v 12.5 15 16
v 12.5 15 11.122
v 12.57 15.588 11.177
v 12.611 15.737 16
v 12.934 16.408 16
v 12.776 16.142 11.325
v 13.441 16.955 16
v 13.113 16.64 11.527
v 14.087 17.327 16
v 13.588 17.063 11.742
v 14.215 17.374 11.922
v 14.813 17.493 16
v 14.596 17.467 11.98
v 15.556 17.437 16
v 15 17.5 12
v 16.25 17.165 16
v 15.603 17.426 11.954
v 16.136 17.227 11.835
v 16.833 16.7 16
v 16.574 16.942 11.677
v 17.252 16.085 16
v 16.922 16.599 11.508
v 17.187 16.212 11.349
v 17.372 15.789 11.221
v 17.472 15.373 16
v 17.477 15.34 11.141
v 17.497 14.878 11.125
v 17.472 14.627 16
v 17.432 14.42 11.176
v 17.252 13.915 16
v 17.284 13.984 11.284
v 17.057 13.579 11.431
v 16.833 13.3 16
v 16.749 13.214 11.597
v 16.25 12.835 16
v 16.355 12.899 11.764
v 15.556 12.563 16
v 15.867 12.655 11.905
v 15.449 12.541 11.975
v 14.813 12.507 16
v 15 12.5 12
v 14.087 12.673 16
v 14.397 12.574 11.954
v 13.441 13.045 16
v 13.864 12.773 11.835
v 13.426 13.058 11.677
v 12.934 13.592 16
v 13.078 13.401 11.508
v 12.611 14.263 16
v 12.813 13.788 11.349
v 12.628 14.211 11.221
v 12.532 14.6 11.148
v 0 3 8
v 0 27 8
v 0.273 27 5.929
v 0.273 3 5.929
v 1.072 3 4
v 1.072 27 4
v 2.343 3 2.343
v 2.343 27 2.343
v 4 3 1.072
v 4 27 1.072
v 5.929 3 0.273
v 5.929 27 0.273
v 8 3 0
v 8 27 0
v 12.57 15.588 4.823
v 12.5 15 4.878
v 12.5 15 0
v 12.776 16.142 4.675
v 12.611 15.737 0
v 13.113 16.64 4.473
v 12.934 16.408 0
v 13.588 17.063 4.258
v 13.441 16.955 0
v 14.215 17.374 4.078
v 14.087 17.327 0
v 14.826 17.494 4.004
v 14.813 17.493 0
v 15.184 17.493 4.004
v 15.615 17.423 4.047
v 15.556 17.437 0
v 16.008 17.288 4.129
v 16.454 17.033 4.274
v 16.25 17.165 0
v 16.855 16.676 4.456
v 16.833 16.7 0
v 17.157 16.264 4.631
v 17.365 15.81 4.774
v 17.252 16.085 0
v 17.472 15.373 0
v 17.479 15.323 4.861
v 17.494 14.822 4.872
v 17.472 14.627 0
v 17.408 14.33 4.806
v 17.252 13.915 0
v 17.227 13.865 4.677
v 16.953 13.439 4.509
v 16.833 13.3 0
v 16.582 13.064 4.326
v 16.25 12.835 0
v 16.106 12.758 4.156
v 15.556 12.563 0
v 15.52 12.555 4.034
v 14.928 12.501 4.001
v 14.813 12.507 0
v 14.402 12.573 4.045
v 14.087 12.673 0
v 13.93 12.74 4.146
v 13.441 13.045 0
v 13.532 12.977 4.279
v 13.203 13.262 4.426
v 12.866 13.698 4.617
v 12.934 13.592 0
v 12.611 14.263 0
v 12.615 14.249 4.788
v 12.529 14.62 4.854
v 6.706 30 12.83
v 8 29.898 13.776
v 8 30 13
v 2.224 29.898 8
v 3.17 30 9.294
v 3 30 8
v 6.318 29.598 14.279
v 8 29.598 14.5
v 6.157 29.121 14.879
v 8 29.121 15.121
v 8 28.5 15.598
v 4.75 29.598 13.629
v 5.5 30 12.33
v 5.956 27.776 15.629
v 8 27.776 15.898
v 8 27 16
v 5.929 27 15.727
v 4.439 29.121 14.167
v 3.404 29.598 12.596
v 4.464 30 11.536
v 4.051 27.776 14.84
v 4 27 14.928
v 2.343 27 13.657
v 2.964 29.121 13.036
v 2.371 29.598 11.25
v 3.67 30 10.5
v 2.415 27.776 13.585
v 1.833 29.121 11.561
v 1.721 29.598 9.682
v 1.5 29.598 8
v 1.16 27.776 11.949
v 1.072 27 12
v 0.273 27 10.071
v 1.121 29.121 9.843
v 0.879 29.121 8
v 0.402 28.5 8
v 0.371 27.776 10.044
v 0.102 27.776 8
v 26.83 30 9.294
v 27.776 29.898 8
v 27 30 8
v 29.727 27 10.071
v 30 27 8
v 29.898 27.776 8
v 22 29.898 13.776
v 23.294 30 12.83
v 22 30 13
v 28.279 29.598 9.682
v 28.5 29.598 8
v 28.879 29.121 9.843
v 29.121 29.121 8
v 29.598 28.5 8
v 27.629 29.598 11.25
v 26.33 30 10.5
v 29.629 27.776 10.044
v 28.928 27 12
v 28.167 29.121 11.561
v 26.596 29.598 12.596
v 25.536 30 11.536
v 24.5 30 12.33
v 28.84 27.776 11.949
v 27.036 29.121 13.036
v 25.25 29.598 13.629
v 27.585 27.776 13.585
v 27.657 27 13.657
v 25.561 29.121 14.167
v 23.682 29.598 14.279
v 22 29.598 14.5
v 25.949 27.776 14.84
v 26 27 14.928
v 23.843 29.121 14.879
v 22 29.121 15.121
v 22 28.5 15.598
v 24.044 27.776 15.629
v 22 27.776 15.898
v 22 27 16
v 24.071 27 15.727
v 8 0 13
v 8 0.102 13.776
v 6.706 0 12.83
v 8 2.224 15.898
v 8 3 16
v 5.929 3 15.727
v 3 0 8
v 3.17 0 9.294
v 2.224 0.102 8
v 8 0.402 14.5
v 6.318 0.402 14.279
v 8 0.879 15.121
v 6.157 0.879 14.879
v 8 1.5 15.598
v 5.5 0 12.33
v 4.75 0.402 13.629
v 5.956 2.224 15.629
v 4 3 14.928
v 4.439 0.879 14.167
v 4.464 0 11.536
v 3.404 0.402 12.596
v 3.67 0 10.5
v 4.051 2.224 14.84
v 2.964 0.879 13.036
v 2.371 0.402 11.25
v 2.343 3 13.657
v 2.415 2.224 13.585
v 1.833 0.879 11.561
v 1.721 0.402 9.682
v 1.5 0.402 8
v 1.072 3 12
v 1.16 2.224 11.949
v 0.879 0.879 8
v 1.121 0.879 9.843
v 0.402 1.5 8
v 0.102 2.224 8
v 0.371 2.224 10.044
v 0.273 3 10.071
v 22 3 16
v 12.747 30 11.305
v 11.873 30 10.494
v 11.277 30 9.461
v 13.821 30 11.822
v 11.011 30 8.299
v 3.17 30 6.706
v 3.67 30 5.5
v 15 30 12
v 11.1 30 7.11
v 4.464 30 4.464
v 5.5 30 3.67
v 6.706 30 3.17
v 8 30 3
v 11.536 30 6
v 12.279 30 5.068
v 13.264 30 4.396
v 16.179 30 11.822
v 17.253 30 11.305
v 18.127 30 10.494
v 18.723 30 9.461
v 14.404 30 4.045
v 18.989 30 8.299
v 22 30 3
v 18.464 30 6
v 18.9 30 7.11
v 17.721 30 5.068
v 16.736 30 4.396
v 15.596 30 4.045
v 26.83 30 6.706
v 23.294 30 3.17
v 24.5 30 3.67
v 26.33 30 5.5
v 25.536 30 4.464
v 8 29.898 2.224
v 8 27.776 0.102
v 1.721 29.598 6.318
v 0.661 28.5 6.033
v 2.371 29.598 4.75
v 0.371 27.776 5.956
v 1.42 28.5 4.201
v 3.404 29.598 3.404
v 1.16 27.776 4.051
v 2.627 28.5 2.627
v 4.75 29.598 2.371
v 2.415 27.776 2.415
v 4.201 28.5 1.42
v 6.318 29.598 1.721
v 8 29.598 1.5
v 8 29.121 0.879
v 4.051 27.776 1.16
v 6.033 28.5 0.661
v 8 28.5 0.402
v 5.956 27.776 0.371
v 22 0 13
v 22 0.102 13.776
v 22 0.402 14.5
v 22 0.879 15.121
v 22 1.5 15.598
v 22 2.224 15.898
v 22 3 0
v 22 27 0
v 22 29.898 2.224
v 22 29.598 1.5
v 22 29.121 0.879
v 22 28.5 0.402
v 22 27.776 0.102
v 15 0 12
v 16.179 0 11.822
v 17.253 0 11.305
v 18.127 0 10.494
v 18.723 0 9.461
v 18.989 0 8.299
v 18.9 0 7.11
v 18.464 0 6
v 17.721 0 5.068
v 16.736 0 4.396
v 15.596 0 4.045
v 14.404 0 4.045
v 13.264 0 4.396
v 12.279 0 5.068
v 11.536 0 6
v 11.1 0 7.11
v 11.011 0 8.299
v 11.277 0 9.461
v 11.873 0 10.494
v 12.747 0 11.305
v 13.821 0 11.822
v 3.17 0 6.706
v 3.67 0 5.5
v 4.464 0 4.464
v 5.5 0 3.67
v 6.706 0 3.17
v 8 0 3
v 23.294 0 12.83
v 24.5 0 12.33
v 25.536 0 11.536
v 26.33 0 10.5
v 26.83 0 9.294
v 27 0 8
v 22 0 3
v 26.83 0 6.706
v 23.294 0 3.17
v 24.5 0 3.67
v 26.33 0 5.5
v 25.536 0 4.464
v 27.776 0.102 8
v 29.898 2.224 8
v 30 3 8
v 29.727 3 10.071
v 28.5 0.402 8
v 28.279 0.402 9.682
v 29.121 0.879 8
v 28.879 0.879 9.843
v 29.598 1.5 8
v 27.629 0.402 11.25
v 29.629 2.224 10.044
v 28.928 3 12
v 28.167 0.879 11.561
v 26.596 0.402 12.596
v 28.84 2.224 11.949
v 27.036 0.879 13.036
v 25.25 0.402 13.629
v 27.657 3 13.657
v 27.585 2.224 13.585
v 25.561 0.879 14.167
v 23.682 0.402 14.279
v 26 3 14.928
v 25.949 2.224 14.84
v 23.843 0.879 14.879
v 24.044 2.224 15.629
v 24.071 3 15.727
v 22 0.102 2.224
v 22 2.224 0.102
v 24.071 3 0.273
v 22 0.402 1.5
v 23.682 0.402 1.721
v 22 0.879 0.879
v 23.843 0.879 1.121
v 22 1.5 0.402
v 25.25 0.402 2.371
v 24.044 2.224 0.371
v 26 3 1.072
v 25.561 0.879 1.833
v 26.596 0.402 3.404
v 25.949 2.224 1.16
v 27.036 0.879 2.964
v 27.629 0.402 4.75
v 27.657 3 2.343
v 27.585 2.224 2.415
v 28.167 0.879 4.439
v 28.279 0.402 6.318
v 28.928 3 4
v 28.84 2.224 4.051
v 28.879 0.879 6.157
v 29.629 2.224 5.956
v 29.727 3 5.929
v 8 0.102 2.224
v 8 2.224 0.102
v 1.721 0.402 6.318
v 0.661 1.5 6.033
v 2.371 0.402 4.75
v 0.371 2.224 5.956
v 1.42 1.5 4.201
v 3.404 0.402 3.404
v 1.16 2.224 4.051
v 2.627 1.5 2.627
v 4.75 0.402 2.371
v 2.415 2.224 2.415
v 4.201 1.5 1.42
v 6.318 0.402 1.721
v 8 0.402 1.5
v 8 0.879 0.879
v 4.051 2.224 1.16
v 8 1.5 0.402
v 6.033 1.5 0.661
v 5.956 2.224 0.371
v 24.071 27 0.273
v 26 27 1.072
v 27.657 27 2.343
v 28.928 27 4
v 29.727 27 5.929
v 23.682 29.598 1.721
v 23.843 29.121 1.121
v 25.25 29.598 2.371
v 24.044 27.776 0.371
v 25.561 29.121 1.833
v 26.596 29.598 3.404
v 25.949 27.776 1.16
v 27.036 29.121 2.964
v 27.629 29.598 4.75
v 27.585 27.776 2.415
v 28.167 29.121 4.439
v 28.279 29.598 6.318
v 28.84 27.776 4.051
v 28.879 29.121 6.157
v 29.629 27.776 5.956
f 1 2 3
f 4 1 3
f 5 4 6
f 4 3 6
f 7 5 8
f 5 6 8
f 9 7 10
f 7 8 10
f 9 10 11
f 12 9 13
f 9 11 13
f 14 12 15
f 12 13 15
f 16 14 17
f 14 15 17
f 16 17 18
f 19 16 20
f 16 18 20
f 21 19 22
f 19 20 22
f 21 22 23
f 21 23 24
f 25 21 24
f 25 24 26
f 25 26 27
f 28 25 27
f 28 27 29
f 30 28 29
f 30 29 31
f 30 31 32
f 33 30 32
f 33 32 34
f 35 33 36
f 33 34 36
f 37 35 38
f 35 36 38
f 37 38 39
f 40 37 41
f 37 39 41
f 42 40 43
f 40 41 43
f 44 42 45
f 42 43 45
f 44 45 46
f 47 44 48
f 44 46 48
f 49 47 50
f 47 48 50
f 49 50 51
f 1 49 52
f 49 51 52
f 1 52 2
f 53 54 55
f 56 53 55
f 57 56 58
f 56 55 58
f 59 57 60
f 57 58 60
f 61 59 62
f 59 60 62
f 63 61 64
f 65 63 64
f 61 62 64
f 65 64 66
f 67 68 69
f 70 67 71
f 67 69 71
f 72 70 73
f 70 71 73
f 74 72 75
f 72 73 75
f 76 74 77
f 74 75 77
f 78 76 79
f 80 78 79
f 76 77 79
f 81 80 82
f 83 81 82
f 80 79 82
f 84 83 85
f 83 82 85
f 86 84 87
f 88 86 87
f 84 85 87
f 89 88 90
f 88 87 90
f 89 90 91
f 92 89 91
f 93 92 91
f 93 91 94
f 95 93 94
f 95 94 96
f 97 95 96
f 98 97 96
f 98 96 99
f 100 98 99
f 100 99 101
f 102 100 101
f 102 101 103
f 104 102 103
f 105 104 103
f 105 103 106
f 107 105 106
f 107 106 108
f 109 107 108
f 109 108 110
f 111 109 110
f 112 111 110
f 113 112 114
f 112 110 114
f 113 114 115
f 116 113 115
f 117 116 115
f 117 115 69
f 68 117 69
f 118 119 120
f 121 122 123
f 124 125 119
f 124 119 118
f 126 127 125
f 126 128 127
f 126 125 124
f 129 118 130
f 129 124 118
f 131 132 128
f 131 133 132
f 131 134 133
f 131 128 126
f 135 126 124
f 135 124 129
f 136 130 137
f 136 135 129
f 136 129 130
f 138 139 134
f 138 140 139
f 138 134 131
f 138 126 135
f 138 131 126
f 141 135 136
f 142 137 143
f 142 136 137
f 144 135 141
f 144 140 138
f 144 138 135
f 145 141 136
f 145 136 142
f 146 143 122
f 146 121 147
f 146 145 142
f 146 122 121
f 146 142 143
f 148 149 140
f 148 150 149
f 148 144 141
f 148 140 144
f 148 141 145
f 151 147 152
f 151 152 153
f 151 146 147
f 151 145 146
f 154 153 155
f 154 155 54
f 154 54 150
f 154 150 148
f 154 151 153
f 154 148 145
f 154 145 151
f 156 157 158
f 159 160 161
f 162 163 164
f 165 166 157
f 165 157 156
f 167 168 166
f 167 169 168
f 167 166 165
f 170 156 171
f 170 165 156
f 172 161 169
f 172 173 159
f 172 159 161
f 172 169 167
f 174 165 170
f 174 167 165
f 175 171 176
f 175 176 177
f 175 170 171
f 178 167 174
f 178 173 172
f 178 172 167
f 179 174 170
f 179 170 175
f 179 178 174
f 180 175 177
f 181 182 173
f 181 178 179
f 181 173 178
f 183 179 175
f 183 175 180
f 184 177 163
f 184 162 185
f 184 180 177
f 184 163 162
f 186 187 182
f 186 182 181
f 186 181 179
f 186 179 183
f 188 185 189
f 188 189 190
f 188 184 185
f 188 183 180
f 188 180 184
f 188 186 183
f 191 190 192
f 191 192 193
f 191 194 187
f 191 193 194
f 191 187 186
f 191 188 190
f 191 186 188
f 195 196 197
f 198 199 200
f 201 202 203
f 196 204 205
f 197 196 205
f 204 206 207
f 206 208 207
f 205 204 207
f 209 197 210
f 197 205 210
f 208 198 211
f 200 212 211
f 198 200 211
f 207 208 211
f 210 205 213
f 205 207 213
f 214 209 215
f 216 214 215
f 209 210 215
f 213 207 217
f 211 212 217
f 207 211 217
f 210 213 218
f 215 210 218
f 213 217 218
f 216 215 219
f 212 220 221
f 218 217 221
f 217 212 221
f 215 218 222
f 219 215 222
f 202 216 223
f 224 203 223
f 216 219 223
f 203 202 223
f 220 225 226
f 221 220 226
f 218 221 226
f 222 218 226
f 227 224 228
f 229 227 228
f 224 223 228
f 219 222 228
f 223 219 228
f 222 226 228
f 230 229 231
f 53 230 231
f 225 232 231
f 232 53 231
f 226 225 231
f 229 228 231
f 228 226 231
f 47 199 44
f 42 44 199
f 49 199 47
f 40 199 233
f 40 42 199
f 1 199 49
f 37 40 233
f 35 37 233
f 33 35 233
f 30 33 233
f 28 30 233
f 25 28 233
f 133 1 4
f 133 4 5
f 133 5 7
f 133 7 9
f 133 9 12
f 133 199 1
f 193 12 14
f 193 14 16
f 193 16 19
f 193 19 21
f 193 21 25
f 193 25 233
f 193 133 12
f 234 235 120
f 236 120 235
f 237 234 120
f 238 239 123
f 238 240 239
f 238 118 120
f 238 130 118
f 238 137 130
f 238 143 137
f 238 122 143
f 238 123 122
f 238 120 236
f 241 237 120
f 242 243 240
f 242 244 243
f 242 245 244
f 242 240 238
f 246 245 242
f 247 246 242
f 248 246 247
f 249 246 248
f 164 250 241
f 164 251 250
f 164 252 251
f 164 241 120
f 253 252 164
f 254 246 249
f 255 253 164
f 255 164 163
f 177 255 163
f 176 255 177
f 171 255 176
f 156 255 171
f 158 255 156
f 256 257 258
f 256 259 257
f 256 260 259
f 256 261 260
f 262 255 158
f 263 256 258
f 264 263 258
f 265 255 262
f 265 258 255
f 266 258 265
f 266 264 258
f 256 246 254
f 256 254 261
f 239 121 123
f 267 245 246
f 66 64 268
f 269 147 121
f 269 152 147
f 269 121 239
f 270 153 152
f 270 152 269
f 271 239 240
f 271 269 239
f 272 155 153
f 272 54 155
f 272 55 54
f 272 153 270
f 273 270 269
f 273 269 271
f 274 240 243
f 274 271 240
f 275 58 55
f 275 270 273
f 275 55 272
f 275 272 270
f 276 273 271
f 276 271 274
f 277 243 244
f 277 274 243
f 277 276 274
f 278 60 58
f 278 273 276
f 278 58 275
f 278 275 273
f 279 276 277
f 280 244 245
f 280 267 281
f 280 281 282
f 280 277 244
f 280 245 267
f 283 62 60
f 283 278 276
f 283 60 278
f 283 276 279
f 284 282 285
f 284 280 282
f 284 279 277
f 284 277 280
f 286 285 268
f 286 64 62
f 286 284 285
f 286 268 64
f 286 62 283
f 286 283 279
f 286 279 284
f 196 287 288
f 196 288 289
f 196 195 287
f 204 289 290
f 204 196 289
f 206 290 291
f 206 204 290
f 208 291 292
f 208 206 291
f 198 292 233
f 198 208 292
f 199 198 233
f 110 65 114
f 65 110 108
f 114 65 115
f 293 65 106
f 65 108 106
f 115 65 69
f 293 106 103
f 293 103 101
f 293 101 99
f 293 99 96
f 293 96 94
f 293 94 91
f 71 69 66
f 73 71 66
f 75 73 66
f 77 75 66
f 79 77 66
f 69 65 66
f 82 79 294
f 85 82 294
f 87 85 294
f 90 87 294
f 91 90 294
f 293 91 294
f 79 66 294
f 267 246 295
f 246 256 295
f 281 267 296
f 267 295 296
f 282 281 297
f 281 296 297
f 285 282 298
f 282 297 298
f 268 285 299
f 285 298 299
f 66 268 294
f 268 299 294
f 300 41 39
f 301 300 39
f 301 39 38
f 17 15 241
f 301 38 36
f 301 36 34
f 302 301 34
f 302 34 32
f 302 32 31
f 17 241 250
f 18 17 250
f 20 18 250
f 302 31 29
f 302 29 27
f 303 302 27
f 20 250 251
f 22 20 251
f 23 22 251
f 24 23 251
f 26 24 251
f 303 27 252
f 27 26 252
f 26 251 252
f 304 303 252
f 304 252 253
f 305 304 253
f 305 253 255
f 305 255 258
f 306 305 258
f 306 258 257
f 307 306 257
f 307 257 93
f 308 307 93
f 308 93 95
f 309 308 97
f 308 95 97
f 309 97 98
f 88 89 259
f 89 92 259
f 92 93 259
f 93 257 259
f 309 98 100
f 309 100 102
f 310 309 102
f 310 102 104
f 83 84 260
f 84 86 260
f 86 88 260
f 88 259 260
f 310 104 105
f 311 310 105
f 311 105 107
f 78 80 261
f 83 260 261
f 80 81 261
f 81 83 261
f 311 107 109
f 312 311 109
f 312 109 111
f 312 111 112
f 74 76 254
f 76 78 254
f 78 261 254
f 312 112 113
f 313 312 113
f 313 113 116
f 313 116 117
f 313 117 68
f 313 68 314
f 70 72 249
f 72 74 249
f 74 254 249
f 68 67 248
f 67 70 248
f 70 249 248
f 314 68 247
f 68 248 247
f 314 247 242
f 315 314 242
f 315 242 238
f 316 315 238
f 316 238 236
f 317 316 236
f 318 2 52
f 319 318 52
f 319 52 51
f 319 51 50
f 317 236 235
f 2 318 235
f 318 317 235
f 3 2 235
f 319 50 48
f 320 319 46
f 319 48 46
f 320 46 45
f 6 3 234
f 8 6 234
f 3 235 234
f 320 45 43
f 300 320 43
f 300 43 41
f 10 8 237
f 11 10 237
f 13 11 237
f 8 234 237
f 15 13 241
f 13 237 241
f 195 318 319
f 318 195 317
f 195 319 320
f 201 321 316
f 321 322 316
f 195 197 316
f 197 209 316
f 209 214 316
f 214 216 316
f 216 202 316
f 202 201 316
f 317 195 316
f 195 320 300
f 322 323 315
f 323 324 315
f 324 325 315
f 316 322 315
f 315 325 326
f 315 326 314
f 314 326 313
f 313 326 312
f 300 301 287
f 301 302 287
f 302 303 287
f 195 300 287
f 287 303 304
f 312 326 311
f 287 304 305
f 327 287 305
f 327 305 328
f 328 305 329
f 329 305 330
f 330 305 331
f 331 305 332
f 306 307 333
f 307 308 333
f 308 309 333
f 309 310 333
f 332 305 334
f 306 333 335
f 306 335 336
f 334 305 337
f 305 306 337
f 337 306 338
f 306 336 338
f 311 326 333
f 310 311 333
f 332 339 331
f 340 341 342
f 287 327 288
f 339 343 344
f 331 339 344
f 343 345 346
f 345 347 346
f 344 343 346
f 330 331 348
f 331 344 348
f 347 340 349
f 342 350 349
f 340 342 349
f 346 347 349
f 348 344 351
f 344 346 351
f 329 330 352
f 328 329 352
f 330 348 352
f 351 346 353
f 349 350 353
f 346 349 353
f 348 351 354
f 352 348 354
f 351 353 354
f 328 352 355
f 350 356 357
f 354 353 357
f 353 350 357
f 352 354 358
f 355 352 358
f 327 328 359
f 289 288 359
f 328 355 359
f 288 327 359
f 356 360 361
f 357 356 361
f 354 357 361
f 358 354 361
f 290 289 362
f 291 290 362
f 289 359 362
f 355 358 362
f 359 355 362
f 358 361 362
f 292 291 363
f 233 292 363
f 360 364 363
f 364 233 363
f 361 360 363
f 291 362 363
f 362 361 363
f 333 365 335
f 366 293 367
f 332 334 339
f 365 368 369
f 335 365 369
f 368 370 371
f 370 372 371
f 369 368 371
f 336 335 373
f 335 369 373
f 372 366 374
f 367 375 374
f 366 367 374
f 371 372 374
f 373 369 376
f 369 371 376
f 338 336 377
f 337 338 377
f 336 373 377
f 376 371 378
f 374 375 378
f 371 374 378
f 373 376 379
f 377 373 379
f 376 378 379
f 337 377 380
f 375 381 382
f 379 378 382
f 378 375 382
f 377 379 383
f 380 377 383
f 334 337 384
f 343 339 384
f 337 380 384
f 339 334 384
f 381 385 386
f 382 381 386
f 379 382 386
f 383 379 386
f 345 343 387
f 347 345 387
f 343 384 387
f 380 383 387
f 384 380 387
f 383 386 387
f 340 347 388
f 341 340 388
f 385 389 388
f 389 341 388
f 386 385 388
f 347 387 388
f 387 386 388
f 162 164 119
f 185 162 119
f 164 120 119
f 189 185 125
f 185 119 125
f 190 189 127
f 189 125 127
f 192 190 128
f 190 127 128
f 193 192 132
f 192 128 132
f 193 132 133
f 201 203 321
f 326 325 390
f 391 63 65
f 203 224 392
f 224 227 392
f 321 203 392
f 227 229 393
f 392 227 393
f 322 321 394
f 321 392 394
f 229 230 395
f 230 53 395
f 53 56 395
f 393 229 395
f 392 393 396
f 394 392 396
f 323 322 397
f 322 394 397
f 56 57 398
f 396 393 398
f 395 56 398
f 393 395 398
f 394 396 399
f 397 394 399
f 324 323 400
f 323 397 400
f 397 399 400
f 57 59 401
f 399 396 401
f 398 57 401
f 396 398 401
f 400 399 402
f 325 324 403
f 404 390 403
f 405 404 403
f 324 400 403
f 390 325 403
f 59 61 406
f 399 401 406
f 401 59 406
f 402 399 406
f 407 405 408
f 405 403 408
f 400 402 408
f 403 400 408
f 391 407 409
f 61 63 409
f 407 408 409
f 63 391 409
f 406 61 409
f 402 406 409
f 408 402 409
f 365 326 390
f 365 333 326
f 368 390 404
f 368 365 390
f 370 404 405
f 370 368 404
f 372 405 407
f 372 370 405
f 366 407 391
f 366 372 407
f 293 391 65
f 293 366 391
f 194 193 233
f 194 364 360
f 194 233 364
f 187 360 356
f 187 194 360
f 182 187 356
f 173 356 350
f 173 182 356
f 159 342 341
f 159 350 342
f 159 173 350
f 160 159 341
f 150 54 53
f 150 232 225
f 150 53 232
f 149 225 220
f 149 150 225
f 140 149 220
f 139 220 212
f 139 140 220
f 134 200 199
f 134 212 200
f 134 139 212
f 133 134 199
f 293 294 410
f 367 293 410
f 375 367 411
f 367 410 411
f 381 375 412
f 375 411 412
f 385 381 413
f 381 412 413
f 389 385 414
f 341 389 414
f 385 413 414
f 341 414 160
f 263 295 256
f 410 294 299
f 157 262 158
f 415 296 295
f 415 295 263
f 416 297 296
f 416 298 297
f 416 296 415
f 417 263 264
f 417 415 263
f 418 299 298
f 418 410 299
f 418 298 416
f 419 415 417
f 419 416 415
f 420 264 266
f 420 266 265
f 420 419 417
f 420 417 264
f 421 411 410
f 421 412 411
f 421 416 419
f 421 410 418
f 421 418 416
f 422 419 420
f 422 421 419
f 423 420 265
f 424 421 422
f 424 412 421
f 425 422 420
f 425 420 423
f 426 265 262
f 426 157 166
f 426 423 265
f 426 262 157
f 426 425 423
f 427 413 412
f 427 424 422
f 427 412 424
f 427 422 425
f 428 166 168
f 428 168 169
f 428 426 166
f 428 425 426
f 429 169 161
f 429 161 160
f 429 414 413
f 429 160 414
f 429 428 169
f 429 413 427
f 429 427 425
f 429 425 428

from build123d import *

# Parameters (mm, degrees)
SKETCH1_W           = 30
SKETCH1_H           = 30
BOSS_EXTRUDE1_DEPTH = 16
SKETCH2_R           = 2.5
CUT_EXTRUDE1_DEPTH  = 46.343136195
SKETCH3_R           = 4
CUT_EXTRUDE2_DEPTH  = 46.343136195
FILLET1_R           = 8
FILLET2_R           = 3


with BuildPart() as part:
    # Sketch1 → Boss-Extrude1 (new body)
    with BuildSketch(Plane.XY):
        with Locations((15, 15)):
            Rectangle(SKETCH1_W, SKETCH1_H)
    extrude(amount=BOSS_EXTRUDE1_DEPTH)

    # Sketch2 → Cut-Extrude1 (cut, through all)
    with BuildSketch(Plane(origin=(0, 0, 0), x_dir=(-1, 0, 0), z_dir=(0, 0, -1))):
        with Locations((-15, 15)):
            Circle(SKETCH2_R)
    extrude(amount=-CUT_EXTRUDE1_DEPTH, mode=Mode.SUBTRACT)

    # Sketch3 → Cut-Extrude2 (cut, through all)
    with BuildSketch(Plane(origin=(0, 30, 0), x_dir=(1, 0, 0), z_dir=(0, 1, 0))):
        with Locations(Location((15, -8, 0), (0, 0, 270))):
            Circle(SKETCH3_R)
    extrude(amount=-CUT_EXTRUDE2_DEPTH, mode=Mode.SUBTRACT)

    # Fillet1
    fillet1_edges = [part.edges().sort_by_distance(p)[0] for p in [
        (30, 15, 0),
        (30, 15, 16),
        (0, 15, 0),
        (0, 15, 16),
    ]]
    fillet(fillet1_edges, radius=FILLET1_R - 0.0001)  # a hair under: the kernel refuses the full size

    # Fillet2
    fillet2_edges = [part.edges().sort_by_distance(p)[0] for p in [
        (15, 30, 0),
        (15, 30, 16),
        (2.343116461, 30, 13.656883539),
        (2.343116461, 30, 2.343116461),
        (27.656883539, 30, 13.656883539),
        (27.656883539, 30, 2.343116461),
        (15, 0, 0),
        (15, 0, 16),
        (2.343116461, 0, 13.656883539),
        (2.343116461, 0, 2.343116461),
        (27.656883539, 0, 13.656883539),
        (27.656883539, 0, 2.343116461),
    ]]
    fillet(fillet2_edges, radius=FILLET2_R)


solid = part.part
